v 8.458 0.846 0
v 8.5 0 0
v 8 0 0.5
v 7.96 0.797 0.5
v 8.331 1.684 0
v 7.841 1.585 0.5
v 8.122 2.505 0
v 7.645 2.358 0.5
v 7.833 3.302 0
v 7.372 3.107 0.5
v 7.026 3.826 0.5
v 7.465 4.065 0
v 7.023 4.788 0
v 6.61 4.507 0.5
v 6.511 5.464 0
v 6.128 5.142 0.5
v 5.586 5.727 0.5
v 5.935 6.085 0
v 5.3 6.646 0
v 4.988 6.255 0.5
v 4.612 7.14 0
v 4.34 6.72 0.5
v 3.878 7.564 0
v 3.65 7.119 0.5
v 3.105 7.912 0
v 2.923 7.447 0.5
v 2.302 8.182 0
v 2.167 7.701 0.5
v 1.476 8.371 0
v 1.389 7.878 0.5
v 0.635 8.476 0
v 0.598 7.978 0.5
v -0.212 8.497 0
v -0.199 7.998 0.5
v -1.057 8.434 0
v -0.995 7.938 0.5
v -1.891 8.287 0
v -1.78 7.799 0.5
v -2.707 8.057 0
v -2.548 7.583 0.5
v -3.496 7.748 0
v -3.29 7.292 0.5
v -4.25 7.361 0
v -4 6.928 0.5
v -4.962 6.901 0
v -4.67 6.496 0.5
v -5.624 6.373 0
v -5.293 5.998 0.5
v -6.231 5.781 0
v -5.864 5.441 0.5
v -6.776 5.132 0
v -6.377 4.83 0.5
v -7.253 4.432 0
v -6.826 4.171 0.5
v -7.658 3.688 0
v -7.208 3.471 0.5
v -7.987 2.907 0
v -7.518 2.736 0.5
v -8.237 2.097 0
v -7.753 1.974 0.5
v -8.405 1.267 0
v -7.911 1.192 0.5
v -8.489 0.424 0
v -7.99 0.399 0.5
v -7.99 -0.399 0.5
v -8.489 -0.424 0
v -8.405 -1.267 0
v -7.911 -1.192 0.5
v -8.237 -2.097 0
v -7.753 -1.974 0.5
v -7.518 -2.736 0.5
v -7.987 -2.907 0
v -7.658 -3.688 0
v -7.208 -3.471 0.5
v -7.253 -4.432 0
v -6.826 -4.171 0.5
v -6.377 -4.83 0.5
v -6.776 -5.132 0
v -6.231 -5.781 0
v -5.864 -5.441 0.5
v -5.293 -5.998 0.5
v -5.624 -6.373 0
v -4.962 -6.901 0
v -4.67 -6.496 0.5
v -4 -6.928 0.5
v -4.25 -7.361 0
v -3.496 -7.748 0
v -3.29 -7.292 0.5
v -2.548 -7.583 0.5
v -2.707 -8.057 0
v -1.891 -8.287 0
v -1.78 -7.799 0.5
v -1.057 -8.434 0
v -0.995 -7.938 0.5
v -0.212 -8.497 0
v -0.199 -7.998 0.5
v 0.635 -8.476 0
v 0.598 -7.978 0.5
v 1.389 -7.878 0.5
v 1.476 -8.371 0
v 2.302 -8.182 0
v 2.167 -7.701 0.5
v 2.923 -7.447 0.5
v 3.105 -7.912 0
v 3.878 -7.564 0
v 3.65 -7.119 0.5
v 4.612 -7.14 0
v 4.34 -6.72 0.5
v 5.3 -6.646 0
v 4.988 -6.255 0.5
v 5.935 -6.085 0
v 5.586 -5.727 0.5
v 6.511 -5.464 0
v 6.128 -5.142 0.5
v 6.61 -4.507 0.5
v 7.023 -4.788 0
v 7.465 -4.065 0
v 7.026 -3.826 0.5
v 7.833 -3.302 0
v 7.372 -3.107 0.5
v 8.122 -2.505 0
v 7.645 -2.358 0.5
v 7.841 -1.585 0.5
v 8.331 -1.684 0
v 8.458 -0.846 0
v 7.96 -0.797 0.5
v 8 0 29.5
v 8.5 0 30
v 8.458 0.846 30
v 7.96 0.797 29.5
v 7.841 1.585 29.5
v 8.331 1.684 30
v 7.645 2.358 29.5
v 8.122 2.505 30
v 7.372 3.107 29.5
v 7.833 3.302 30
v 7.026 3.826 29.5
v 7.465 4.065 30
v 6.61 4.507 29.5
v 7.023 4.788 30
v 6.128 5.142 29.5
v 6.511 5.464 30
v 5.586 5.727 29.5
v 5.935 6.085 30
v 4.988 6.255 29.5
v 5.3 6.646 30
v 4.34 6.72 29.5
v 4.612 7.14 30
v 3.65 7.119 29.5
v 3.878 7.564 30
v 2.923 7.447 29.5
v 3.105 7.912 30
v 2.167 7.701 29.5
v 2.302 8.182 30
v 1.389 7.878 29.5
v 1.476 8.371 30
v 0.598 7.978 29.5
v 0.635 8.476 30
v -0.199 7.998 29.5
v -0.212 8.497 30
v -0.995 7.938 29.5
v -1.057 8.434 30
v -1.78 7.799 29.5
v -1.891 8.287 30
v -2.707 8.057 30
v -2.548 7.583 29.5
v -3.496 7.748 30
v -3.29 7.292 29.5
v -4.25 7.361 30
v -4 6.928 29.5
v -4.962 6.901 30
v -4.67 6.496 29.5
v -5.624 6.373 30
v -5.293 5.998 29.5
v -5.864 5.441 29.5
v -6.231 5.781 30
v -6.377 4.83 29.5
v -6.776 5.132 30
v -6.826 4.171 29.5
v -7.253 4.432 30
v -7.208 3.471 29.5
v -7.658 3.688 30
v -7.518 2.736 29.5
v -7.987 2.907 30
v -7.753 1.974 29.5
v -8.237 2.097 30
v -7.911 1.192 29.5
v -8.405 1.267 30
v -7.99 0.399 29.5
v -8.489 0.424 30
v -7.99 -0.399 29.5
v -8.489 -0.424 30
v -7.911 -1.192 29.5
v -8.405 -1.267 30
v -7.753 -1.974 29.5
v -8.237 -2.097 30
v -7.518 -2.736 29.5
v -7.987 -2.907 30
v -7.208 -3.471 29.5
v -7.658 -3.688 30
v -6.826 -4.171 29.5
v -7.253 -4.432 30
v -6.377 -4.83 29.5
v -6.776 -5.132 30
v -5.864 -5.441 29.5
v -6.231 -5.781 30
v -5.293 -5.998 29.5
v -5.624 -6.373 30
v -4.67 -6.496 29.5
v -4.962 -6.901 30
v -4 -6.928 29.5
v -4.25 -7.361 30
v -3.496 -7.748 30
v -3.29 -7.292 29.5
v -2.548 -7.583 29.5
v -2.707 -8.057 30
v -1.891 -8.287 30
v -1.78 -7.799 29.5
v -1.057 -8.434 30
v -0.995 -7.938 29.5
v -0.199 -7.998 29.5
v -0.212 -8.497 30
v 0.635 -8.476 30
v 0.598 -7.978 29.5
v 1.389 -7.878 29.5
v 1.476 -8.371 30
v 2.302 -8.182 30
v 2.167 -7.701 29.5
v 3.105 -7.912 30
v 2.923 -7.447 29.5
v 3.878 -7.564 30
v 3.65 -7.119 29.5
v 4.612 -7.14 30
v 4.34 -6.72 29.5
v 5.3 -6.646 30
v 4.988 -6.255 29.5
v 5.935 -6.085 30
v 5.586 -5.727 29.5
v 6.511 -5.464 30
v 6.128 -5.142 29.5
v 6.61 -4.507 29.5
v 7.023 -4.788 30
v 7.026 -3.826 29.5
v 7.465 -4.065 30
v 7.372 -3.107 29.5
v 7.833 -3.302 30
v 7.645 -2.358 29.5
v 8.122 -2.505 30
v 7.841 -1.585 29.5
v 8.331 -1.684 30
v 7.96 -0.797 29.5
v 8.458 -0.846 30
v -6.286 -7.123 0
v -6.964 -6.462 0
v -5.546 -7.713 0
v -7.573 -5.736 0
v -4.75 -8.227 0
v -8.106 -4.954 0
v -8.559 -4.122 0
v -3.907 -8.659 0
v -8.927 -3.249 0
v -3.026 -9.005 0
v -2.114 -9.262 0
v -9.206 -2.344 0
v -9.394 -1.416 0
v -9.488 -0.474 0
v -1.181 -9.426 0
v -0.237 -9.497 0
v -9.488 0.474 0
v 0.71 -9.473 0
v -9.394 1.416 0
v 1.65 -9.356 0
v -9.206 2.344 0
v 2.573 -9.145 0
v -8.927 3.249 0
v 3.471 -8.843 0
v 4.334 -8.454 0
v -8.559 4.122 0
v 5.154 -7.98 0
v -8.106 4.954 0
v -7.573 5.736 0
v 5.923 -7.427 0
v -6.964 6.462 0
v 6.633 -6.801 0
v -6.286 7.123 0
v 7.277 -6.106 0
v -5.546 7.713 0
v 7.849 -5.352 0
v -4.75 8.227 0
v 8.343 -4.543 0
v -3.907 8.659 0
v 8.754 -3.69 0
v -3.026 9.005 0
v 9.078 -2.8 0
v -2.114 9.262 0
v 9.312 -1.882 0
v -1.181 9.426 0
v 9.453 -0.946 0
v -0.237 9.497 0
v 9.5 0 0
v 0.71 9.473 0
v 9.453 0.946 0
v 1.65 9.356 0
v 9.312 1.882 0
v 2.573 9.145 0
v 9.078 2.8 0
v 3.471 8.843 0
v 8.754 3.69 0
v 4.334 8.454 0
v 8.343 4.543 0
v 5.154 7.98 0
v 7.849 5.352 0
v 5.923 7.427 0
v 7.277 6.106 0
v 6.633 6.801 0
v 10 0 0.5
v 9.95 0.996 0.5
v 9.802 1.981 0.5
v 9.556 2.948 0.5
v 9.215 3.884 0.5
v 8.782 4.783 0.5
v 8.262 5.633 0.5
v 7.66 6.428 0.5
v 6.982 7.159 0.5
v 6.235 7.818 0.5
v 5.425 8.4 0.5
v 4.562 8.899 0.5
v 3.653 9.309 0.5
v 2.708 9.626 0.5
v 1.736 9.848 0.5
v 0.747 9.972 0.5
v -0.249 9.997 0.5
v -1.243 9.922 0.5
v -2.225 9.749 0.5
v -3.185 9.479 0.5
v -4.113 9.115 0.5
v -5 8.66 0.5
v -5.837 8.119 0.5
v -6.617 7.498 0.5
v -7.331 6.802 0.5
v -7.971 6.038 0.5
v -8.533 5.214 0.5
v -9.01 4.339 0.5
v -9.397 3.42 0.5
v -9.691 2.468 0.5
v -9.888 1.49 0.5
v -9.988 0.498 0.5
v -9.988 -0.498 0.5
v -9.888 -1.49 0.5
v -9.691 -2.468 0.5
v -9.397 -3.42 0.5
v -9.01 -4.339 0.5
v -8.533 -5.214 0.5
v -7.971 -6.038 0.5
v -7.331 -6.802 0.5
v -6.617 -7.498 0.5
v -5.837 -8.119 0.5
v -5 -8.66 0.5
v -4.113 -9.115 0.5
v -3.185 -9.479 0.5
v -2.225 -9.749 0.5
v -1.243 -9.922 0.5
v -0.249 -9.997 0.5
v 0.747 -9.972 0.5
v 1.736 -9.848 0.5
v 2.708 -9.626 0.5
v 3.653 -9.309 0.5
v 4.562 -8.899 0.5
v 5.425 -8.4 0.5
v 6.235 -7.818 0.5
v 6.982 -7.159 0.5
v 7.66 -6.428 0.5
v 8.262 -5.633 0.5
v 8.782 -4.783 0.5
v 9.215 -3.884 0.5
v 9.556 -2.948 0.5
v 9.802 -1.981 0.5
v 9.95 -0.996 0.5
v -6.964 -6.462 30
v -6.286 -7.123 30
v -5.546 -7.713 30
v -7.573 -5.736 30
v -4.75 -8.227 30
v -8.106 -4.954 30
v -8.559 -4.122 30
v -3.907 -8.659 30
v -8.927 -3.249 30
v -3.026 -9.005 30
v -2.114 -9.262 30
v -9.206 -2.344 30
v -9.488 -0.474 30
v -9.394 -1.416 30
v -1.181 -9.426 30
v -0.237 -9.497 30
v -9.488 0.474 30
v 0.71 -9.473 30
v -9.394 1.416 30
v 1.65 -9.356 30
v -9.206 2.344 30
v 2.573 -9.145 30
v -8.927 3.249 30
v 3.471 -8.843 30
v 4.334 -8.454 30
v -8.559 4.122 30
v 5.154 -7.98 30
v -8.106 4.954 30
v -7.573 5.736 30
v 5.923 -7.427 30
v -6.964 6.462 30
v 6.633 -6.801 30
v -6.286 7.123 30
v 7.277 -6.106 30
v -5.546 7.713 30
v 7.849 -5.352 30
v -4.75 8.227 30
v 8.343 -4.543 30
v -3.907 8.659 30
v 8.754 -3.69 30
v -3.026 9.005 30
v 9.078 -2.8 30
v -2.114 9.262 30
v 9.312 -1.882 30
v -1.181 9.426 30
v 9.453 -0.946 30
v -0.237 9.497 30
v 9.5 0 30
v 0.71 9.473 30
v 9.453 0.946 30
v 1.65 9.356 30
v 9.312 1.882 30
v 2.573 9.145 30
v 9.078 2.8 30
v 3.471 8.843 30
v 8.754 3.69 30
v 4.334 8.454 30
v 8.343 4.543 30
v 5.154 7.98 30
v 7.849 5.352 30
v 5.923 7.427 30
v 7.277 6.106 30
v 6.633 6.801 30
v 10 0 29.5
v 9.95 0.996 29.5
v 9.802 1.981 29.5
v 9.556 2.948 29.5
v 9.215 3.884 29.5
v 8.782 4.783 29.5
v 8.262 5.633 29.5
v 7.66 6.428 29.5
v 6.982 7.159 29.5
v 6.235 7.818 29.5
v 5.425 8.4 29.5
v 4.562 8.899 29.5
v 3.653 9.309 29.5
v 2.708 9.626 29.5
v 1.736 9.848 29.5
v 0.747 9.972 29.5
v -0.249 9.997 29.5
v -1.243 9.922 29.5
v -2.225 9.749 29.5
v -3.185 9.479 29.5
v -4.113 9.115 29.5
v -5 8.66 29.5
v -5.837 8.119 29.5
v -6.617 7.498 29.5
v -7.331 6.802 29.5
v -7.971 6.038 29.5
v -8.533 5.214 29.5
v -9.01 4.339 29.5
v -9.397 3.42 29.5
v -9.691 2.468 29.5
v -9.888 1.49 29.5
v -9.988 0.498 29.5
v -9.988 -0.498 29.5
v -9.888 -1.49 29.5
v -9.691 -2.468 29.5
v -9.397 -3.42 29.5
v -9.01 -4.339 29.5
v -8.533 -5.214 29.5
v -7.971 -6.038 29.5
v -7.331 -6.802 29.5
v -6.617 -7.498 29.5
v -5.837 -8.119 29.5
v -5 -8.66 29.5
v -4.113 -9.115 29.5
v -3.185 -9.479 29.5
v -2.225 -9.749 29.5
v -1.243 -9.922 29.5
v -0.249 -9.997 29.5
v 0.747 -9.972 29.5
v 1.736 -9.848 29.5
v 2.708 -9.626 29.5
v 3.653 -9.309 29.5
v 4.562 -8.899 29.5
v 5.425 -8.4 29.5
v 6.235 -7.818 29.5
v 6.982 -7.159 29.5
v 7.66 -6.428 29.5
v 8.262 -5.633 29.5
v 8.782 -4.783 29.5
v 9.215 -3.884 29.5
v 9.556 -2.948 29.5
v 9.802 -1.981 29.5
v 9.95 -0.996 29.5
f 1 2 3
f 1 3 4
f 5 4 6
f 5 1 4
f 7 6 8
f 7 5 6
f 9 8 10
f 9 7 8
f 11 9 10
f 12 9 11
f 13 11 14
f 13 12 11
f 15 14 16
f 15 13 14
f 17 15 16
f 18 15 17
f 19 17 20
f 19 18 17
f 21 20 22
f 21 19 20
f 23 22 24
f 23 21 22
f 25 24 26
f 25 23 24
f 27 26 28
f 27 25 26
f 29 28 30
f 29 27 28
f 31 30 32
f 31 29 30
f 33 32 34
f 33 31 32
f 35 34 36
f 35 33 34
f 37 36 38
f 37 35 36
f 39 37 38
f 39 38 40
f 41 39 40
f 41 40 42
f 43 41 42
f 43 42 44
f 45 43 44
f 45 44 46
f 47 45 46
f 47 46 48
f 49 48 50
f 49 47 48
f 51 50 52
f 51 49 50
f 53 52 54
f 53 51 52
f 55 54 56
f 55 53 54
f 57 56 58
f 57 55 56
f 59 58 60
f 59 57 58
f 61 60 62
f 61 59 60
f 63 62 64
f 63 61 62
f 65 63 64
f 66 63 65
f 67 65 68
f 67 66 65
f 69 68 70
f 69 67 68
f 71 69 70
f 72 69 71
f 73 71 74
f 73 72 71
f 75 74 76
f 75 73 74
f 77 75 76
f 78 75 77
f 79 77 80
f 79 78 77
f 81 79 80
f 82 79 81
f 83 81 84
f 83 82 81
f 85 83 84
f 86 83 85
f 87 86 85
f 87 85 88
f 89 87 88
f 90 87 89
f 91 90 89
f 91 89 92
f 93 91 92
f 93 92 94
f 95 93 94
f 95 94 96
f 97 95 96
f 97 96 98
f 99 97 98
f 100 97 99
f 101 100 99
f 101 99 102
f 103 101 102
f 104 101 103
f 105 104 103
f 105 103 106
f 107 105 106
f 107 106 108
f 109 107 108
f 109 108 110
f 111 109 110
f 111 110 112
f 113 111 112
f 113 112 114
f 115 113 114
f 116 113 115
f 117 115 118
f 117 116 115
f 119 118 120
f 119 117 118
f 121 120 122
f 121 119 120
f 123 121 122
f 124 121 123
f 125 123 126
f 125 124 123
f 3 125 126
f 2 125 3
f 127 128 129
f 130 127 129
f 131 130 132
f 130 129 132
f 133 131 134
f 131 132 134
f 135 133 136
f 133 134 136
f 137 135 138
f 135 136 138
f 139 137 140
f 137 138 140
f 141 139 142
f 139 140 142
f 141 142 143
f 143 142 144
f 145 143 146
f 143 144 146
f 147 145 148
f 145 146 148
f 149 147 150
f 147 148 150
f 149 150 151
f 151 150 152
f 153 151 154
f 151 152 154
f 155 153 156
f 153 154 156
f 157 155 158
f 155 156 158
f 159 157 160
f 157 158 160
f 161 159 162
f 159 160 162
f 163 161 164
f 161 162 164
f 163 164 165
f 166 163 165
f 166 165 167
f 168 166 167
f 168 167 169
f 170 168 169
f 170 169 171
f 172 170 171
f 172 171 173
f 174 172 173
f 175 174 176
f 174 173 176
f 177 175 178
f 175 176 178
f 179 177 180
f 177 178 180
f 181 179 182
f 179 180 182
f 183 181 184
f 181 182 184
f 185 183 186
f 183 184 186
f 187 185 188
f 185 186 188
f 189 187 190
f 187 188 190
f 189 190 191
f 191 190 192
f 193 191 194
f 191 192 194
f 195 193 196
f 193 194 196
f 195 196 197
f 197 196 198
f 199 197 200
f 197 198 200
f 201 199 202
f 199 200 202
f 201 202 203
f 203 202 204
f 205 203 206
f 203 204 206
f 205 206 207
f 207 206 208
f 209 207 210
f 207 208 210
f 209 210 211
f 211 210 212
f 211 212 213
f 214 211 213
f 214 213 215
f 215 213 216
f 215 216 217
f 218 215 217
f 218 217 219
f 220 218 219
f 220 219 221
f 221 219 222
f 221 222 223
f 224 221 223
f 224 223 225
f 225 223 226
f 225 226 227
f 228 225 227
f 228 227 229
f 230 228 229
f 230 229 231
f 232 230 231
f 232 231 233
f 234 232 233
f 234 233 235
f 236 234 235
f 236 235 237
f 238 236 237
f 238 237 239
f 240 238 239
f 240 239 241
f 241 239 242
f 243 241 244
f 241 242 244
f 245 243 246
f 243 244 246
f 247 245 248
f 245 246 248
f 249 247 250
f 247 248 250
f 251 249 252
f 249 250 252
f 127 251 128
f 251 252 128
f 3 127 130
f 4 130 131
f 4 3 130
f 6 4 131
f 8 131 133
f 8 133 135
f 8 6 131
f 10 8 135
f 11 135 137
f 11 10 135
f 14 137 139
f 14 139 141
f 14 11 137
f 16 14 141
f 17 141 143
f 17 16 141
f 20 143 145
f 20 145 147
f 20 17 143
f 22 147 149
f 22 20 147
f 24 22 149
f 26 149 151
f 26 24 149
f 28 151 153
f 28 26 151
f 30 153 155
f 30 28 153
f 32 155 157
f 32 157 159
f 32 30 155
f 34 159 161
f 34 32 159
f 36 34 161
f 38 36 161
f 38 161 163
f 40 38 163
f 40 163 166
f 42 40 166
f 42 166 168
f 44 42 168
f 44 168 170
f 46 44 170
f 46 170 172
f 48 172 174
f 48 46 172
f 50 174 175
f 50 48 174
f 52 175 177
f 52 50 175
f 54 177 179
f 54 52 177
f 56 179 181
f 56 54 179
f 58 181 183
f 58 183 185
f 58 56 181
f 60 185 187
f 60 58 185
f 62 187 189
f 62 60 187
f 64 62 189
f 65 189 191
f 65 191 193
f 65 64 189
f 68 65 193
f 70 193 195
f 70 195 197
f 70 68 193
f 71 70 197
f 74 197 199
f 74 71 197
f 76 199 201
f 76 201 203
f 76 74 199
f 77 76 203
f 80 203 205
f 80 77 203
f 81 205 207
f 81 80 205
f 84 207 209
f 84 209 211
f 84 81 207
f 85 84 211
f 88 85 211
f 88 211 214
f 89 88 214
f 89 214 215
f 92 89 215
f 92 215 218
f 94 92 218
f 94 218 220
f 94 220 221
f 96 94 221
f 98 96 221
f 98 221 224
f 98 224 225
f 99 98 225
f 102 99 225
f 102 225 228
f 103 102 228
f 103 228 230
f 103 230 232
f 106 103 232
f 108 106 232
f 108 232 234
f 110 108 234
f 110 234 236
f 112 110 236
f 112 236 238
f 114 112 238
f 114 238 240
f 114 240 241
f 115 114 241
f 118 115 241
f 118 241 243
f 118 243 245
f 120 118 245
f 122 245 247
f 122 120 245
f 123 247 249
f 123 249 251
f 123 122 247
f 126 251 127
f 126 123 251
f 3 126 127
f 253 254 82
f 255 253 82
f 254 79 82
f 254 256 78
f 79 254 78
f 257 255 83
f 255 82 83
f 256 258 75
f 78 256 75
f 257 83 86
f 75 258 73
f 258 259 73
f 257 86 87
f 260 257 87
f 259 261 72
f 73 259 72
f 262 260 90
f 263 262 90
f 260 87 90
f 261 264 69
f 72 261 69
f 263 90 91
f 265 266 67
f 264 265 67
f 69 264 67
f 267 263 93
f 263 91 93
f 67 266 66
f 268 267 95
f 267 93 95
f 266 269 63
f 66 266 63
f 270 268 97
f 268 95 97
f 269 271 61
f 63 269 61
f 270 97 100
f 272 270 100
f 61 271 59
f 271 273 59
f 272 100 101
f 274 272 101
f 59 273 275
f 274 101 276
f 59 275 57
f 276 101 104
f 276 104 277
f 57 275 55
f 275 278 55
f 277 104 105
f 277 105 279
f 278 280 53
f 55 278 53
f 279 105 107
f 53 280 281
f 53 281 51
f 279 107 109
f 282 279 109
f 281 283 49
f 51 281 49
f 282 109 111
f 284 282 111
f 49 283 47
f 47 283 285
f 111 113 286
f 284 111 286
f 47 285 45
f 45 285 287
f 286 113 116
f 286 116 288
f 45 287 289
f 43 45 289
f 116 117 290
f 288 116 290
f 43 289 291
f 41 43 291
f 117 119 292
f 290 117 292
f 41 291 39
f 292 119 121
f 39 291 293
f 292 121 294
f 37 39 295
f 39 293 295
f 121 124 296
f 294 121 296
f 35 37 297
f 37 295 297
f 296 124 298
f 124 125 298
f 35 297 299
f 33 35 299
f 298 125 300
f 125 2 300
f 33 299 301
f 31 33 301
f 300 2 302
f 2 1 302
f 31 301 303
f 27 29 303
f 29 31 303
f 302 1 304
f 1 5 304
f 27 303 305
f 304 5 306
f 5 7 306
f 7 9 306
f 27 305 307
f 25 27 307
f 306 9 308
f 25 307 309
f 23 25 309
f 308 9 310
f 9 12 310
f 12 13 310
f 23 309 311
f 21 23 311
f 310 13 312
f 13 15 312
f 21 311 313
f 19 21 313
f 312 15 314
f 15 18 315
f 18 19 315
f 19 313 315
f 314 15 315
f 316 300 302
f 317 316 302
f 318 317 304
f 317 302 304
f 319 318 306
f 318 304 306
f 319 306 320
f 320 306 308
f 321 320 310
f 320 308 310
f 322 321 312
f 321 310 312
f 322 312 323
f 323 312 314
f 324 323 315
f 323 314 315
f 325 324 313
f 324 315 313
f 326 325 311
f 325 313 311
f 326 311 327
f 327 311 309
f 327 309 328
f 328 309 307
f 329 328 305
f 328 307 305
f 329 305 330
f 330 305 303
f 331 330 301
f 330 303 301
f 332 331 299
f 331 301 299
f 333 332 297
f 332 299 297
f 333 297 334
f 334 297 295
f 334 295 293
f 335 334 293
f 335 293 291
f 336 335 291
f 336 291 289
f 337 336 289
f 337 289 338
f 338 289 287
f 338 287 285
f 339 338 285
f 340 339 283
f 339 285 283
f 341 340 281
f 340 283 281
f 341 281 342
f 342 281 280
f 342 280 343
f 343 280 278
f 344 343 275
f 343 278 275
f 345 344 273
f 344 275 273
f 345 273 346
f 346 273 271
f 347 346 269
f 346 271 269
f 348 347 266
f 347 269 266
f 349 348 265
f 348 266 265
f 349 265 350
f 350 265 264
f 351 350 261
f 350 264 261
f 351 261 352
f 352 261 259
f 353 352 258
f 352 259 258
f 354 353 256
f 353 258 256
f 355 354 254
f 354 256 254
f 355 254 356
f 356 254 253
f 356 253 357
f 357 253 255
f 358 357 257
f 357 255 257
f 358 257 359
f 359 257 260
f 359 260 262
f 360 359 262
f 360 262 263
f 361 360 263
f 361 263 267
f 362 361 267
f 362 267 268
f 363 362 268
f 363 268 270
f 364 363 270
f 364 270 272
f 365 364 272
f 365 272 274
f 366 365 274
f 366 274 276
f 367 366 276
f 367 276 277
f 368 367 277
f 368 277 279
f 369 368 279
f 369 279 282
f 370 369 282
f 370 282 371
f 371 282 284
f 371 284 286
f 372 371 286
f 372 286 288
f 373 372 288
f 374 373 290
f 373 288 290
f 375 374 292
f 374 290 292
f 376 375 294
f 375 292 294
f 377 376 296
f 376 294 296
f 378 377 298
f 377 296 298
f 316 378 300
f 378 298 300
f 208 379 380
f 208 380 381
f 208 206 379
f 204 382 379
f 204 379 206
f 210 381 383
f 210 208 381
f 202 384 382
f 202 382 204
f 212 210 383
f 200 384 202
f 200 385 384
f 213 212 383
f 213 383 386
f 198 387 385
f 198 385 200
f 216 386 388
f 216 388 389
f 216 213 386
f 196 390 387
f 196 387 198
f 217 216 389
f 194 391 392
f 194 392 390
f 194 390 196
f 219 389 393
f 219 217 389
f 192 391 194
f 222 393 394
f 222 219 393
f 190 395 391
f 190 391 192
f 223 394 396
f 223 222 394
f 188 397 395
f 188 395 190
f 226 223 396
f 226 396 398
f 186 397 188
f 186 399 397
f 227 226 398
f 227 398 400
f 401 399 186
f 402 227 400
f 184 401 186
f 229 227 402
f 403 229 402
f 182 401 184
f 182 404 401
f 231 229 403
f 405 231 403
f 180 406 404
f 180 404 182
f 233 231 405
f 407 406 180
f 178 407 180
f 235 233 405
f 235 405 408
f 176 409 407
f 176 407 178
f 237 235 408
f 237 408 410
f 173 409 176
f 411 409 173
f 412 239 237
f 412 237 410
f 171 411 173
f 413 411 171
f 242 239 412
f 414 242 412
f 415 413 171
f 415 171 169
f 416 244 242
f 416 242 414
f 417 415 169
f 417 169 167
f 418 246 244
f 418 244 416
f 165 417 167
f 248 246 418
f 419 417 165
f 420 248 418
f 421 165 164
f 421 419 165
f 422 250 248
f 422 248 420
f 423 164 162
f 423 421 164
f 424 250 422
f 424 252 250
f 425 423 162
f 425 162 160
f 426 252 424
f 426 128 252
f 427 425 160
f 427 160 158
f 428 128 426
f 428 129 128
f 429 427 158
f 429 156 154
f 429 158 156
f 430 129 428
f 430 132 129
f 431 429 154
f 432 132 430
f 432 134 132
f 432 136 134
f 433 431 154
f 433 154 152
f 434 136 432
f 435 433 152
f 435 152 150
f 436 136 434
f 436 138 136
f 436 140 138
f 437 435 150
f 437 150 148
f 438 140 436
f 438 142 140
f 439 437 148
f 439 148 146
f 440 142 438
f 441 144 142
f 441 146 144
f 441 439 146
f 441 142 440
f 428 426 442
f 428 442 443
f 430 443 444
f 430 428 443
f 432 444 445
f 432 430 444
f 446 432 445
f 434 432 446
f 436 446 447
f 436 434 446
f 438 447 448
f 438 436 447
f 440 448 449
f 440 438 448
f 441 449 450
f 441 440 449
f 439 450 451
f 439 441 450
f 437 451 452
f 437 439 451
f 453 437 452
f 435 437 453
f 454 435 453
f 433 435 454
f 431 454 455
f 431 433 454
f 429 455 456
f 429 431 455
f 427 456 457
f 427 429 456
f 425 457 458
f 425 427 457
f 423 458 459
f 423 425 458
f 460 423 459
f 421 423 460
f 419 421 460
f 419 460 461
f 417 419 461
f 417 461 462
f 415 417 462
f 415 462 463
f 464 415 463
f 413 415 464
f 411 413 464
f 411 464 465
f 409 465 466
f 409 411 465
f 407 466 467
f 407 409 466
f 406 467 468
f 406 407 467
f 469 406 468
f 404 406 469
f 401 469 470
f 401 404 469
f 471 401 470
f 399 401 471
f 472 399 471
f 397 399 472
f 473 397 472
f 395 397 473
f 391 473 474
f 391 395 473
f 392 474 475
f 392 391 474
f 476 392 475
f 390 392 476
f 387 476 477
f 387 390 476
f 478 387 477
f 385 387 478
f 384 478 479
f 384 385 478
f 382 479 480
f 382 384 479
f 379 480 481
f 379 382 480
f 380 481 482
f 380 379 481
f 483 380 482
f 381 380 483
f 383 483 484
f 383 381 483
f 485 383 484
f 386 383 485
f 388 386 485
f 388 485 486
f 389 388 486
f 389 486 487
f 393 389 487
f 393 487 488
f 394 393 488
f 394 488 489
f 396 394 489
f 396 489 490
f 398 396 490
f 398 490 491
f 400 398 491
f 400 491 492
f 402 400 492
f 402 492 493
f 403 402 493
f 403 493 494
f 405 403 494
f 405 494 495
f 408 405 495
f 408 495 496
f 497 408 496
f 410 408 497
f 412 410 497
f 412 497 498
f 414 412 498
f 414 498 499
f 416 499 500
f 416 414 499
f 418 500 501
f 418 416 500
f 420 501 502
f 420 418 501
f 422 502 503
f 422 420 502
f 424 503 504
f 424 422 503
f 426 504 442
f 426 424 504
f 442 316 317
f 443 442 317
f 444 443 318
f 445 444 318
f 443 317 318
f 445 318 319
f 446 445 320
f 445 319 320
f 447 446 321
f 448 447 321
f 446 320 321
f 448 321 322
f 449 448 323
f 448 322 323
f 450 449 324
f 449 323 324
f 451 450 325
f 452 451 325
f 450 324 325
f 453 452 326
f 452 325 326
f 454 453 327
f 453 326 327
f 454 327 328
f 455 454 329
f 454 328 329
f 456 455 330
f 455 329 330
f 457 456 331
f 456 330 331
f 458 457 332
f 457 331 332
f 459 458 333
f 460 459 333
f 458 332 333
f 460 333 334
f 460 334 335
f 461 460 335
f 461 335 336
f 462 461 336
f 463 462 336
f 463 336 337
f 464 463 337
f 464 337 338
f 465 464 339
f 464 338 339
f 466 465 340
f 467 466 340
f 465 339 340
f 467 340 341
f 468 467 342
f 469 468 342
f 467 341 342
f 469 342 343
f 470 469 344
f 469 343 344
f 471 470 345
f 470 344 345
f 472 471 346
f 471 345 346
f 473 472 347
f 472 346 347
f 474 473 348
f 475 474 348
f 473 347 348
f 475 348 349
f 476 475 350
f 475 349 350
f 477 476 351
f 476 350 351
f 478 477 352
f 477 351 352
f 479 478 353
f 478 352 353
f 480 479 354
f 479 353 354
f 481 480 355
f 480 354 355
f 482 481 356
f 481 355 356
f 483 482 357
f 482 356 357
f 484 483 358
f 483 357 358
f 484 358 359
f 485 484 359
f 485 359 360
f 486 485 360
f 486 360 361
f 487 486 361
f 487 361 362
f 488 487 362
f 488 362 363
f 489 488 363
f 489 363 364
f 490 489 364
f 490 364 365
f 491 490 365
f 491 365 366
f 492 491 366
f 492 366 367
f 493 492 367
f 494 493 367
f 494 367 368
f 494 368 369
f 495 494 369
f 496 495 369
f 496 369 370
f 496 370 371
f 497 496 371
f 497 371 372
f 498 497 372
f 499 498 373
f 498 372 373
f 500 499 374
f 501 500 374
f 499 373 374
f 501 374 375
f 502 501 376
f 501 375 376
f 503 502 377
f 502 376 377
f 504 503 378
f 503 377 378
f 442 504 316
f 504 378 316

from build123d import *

# Parameters (mm, degrees)
SKETCH_R     = 10
SKETCH_R_2   = 8
PAD_DEPTH    = 30
CHAMFER_SIZE = 0.5


with BuildPart() as part:
    # Sketch → Pad (new body)
    with BuildSketch(Plane.XY):
        Circle(SKETCH_R)
        Circle(SKETCH_R_2, mode=Mode.SUBTRACT)
    extrude(amount=PAD_DEPTH)

    # Chamfer
    chamfer_edges = [part.edges().sort_by_distance(p)[0] for p in [
        (-10, 0, 30),
        (-8, 0, 30),
        (-10, 0, 0),
        (-8, 0, 0),
    ]]
    chamfer(chamfer_edges, length=CHAMFER_SIZE)


solid = part.part
